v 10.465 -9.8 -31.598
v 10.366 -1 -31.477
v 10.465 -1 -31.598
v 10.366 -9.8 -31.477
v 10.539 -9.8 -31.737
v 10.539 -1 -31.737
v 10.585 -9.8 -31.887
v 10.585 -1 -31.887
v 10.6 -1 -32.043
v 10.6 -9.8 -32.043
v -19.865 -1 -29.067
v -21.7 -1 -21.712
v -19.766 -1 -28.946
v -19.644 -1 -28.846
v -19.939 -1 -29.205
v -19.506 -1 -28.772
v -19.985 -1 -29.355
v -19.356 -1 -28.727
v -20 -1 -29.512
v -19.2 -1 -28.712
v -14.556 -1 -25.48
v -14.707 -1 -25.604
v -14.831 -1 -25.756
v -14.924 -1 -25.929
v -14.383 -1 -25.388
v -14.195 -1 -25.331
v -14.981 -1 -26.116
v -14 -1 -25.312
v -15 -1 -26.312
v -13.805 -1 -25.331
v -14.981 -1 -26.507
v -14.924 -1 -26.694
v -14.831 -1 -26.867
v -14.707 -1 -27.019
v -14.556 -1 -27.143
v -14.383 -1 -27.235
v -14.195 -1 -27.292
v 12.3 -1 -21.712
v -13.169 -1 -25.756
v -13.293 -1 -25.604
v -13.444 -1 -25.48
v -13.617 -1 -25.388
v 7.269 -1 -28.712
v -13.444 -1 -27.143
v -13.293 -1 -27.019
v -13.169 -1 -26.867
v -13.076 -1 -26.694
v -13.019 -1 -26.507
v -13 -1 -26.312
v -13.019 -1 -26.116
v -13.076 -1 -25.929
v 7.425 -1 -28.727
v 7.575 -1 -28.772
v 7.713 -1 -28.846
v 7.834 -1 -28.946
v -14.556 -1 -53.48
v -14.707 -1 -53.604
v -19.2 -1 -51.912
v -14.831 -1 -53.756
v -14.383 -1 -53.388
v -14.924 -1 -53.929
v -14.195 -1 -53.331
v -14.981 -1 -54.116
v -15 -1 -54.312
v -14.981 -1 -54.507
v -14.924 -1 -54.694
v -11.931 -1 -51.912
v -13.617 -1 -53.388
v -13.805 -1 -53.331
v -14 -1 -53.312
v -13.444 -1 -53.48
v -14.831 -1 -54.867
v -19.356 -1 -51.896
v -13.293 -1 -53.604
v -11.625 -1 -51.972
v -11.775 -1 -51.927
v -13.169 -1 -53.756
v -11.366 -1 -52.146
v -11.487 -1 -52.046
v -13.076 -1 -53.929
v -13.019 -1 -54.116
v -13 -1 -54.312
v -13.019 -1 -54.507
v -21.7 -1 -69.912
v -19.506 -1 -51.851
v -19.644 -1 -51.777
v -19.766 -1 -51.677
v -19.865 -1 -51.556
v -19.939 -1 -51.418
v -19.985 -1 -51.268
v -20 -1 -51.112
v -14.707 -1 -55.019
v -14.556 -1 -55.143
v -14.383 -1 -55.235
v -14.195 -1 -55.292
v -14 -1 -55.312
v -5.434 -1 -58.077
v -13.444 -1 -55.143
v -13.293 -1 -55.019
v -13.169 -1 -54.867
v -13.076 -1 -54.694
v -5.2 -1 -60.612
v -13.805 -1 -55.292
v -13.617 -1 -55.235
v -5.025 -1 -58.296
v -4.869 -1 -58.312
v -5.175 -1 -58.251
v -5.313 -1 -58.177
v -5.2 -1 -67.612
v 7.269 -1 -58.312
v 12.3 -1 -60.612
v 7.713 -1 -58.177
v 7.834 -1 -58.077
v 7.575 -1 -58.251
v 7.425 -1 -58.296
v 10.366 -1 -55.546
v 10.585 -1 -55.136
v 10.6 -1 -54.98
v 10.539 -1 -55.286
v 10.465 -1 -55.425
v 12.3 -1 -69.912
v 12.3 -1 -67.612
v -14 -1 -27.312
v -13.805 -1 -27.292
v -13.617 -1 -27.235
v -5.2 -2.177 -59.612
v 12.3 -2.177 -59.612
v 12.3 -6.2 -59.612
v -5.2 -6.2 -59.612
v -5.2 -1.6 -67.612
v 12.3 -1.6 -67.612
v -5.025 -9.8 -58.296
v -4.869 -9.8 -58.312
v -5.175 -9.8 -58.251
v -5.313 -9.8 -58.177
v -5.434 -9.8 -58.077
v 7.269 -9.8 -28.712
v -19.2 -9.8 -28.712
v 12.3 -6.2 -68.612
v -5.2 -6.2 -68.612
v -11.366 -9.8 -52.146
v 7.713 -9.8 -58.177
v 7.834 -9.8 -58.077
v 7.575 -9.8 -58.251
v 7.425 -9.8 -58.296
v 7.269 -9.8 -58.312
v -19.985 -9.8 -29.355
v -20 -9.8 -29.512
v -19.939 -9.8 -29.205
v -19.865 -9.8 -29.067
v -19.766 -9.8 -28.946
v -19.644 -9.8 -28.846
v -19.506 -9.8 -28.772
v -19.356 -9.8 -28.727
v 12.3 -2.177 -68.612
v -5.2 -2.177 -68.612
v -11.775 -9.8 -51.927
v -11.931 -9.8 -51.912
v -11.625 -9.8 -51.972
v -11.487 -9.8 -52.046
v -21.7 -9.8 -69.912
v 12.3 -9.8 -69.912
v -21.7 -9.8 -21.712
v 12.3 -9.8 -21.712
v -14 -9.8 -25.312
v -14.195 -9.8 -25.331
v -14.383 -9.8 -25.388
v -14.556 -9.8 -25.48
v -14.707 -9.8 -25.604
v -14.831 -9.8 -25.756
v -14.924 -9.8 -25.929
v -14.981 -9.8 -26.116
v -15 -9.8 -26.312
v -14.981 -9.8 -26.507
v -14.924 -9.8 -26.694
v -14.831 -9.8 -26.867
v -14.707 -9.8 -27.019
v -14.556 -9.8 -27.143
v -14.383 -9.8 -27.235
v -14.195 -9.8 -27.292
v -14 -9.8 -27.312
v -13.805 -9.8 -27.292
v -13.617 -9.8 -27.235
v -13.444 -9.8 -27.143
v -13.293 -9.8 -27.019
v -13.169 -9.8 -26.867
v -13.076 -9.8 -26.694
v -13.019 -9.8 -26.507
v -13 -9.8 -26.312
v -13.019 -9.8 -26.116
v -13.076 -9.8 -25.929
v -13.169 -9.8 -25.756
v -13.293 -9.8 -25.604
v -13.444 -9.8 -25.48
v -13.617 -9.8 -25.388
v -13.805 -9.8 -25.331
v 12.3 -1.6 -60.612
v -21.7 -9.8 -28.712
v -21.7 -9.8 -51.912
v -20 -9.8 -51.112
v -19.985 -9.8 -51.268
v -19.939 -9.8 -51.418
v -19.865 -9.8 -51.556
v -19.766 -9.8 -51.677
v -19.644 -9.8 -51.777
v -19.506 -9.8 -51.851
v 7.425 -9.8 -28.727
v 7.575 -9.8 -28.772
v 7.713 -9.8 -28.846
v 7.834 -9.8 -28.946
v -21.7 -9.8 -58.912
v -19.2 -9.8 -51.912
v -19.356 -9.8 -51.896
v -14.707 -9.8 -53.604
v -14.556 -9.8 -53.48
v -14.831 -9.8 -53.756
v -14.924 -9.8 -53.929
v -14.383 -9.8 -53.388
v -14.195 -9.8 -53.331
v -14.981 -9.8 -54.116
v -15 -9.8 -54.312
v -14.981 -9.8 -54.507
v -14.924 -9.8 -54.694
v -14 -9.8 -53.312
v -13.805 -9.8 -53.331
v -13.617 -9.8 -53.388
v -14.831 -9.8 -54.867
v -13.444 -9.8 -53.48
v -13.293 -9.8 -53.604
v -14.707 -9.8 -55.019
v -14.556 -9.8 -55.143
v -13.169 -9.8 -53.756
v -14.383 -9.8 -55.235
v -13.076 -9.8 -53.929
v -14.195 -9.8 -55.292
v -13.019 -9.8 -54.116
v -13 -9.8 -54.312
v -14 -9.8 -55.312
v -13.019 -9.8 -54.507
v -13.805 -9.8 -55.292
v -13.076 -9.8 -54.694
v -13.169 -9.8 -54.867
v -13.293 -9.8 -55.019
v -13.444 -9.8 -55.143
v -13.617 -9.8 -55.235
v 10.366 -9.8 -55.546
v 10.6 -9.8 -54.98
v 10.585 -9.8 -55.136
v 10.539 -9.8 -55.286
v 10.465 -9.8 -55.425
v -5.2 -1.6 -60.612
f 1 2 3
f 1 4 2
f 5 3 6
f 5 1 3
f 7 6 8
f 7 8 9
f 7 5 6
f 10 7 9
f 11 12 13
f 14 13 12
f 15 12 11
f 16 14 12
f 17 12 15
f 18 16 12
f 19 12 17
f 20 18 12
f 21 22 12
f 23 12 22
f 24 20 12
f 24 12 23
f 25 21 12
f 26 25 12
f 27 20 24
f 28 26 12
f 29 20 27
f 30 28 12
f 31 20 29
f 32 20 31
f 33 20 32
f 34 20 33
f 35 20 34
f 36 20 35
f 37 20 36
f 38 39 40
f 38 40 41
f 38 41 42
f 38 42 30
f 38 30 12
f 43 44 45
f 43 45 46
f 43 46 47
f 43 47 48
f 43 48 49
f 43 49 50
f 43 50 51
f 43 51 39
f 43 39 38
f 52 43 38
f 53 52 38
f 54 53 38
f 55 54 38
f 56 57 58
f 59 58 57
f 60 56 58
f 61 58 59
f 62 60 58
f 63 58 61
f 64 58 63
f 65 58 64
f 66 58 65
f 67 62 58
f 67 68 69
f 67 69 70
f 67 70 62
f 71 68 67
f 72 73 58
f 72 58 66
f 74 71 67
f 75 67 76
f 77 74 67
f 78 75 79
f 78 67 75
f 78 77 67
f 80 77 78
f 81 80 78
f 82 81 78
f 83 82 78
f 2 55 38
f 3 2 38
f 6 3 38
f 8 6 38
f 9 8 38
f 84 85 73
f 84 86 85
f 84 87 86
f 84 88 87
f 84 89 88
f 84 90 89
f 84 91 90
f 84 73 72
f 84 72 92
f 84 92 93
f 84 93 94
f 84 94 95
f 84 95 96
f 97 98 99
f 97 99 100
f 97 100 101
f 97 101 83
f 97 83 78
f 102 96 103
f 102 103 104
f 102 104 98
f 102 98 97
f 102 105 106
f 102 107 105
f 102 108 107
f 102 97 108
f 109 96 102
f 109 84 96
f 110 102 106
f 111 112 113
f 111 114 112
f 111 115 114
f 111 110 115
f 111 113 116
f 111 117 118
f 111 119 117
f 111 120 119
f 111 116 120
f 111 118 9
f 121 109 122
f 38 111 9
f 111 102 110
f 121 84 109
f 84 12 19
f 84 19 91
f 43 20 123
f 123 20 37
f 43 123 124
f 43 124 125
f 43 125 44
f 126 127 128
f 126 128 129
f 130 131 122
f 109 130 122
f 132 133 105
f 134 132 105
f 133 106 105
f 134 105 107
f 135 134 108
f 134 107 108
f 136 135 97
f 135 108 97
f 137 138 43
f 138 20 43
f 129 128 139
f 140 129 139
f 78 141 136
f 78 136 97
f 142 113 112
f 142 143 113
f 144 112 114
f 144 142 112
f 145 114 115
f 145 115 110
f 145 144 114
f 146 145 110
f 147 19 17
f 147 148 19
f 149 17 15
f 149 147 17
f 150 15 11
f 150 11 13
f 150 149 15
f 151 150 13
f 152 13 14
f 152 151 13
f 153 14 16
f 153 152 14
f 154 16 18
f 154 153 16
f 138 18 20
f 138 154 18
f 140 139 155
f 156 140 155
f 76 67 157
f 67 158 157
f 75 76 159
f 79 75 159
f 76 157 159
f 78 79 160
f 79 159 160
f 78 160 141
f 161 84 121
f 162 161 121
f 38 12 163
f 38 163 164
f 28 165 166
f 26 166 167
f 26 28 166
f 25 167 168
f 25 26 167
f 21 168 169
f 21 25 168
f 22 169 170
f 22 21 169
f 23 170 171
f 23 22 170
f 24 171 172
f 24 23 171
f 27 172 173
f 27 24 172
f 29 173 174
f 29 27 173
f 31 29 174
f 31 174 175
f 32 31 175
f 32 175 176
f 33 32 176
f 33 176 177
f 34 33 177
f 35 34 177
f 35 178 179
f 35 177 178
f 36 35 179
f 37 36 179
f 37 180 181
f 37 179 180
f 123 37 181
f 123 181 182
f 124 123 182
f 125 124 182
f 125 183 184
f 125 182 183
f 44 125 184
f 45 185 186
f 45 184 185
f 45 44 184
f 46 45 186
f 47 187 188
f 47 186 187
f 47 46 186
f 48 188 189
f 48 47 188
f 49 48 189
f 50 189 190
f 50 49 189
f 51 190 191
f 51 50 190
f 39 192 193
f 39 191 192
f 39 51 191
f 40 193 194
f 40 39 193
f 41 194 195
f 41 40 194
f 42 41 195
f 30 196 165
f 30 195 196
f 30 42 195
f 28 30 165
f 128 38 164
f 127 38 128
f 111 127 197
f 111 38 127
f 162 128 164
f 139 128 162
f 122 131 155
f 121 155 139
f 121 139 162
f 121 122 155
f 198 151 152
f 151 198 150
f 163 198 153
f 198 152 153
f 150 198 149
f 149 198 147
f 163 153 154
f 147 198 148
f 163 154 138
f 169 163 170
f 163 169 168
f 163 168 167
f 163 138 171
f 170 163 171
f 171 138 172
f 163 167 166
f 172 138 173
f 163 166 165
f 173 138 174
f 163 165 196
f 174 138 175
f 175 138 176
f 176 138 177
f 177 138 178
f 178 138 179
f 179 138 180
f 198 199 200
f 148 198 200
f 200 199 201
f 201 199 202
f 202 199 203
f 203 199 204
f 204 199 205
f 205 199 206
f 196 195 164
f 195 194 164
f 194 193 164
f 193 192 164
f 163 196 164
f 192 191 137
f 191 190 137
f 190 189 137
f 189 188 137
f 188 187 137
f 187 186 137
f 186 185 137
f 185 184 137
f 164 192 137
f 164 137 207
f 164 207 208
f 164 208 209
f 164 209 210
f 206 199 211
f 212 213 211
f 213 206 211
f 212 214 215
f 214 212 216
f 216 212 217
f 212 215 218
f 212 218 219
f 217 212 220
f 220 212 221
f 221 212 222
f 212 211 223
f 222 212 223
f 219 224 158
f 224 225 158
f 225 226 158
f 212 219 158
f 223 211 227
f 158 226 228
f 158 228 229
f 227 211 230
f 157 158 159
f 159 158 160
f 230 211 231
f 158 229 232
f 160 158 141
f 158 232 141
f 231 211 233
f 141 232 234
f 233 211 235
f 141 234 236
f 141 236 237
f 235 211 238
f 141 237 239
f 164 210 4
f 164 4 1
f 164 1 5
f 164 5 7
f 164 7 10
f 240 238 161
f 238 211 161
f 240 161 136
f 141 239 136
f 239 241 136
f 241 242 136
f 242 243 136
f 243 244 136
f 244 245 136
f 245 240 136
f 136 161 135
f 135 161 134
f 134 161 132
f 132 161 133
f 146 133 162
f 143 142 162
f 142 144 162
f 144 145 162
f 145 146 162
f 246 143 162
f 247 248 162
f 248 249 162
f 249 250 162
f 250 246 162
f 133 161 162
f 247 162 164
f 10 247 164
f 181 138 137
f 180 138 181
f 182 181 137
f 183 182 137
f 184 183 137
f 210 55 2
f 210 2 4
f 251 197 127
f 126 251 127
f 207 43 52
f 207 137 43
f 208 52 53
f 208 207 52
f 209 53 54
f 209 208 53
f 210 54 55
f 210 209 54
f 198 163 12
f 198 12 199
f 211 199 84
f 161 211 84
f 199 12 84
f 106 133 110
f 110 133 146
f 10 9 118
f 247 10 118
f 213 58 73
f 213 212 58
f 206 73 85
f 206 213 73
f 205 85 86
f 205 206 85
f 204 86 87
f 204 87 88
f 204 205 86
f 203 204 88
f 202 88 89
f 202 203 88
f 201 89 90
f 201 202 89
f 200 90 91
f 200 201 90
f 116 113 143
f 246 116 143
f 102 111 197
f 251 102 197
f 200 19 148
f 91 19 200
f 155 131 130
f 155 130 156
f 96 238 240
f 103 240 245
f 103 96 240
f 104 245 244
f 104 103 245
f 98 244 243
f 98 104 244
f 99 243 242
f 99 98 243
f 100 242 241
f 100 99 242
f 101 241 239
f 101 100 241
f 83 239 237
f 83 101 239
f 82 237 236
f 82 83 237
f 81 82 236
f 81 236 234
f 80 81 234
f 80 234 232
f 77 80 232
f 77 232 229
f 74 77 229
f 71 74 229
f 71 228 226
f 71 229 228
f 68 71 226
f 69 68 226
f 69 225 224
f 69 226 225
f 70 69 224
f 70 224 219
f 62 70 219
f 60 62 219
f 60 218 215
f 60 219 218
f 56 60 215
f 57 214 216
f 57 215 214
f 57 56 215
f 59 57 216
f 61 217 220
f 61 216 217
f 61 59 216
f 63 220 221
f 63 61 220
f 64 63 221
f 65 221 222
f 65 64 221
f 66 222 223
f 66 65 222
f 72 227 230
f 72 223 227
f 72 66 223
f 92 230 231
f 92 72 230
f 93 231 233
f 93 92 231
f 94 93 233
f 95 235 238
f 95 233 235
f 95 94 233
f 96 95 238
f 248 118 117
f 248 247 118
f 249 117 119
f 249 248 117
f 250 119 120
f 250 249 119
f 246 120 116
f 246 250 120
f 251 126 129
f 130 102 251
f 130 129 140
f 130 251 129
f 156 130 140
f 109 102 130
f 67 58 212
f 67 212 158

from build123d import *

# Parameters (mm, degrees)
BOSS_EXTRUDE1_START      = -1
SKETCH1_W                = 1.7
SKETCH1_H                = 89.2
BOSS_EXTRUDE1_DEPTH      = 8.8
SKETCH4_W                = 33.7
SKETCH4_H                = 11.6
BOSS_EXTRUDE3_DEPTH      = 8.8
SERVO_HOLDER_DEPTH       = 1
SERVO_HOLDER_DEPTH_BACK  = 8.8
SKETCH3_W                = 14
SKETCH3_H                = 7
SKETCH3_R                = 1
SKETCH37_W               = 20
SKETCH37_H               = 7
BOSS_EXTRUDE19_DEPTH     = 9.8
CUT_EXTRUDE10_DEPTH      = 93.434679639
CUT_EXTRUDE10_DEPTH_BACK = 93.434679639
SKETCH29_W               = 34.409909993
SKETCH29_H               = 6.377389624
BOSS_EXTRUDE13_START     = 2
SKETCH30_W               = 34
SKETCH30_H               = 38
SKETCH30_R               = 1.6
BOSS_EXTRUDE13_DEPTH     = 6.5
SKETCH41_W               = 17.288461538
SKETCH41_H               = 8.8
CUT_EXTRUDE14_DEPTH      = 15
BOSS_EXTRUDE14_START     = -38
SKETCH32_R               = 1.45
SKETCH32_R_2             = 5
BOSS_EXTRUDE14_DEPTH     = 8.8
BOSS_EXTRUDE16_DEPTH     = 3
BOSS_EXTRUDE17_DEPTH     = 3
BOSS_EXTRUDE18_DEPTH     = 8.8
SKETCH39_W               = 1.7
SKETCH39_H               = 41.2
BOSS_EXTRUDE20_DEPTH     = 8.8
CUT_EXTRUDE13_DEPTH      = 17.5
CHAMFER2_SIZE            = 0.6
CHAMFER2_SIZE_2          = 1.039230485
CHAMFER3_SIZE            = 3
FILLET10_R               = 6
CUT_EXTRUDE15_DEPTH      = 10
CHAMFER4_SIZE            = 2.5
CUT_EXTRUDE16_DEPTH      = 10
FILLET11_R               = 0.8
SKETCH44_W               = 59.192885725
SKETCH44_H               = 45.417181718
CUT_EXTRUDE17_DEPTH      = 87.948983376


with BuildPart() as part:
    # Sketch1 → Boss-Extrude1 (new body)
    with BuildSketch(Plane(origin=(0, 0, 0), x_dir=(1, 0, 0), z_dir=(0, 1, 0)).offset(BOSS_EXTRUDE1_START)):
        with Locations((-20.85, 25.311538462)):
            Rectangle(SKETCH1_W, SKETCH1_H)
    extrude(amount=-BOSS_EXTRUDE1_DEPTH)

    # Sketch4 → Boss-Extrude3 (add)
    with BuildSketch(Plane.XZ.offset(9.8)):
        with Locations((-4.85, -64.111538462)):
            Rectangle(SKETCH4_W, SKETCH4_H)
    extrude(amount=-BOSS_EXTRUDE3_DEPTH)

    # Sketch3 → Servo Holder (add, two sides: drawn at the far end of the back side and taken through both)
    # profile 1 of 2: a face of its own
    with BuildSketch(Plane.XZ.offset(9.8).offset(-SERVO_HOLDER_DEPTH_BACK)):
        with Locations((-14.7, -55.411538462)):
            Rectangle(SKETCH3_W, SKETCH3_H)
        with Locations(Location((-14, -54.311538462, 0), (0, 0, 270))):
            Circle(SKETCH3_R, mode=Mode.SUBTRACT)
    # profile 2 of 2: a face of its own
    with BuildSketch(Plane.XZ.offset(9.8).offset(-SERVO_HOLDER_DEPTH_BACK)):
        with Locations((-14.7, -25.211538462)):
            Rectangle(SKETCH3_W, SKETCH3_H)
        with Locations(Location((-14, -26.311538462, 0), (0, 0, 90))):
            Circle(SKETCH3_R, mode=Mode.SUBTRACT)
    extrude(amount=SERVO_HOLDER_DEPTH + SERVO_HOLDER_DEPTH_BACK)

    # Sketch37 → Boss-Extrude19 (add)
    with BuildSketch(Plane(origin=(0, -1, 0), x_dir=(1, 0, 0), z_dir=(0, 1, 0))):
        with Locations((2.3, 25.211538462)):
            Rectangle(SKETCH37_W, SKETCH37_H)
    extrude(amount=-BOSS_EXTRUDE19_DEPTH)

    # Sketch29 → Cut-Extrude10 (cut, two sides: drawn at the far end of the back side and taken through both)
    with BuildSketch(Plane(origin=(0, 0, -69.911538462), x_dir=(-1, 0, 0), z_dir=(0, 0, -1)).offset(-CUT_EXTRUDE10_DEPTH_BACK)):
        with Locations((4.495045004, -12.988694812)):
            Rectangle(SKETCH29_W, SKETCH29_H)
    extrude(amount=CUT_EXTRUDE10_DEPTH + CUT_EXTRUDE10_DEPTH_BACK, mode=Mode.SUBTRACT)


with BuildPart() as body_2:
    # Sketch30 → Boss-Extrude13 (new body)
    with BuildSketch(Plane.XY.offset(BOSS_EXTRUDE13_START)):
        with Locations((-4.7, -20)):
            Rectangle(SKETCH30_W, SKETCH30_H)
        with Locations(Location((5.3, -34, 0), (0, 0, 180))):
            Circle(SKETCH30_R, mode=Mode.SUBTRACT)
        with Locations(Location((5.3, -19, 0), (0, 0, 180))):
            Circle(SKETCH30_R, mode=Mode.SUBTRACT)
        with Locations(Location((-14.7, -34, 0), (0, 0, 180))):
            Circle(SKETCH30_R, mode=Mode.SUBTRACT)
        with Locations(Location((-14.7, -19, 0), (0, 0, 180))):
            Circle(SKETCH30_R, mode=Mode.SUBTRACT)
    extrude(amount=BOSS_EXTRUDE13_DEPTH)


with BuildPart() as cut_extrude14_tool:
    # Sketch41 → Cut-Extrude14 (new body)
    with BuildSketch(Plane(origin=(-20, 0, 0), x_dir=(0, 0, -1), z_dir=(1, 0, 0))):
        with Locations((-10.644230769, -5.4)):
            Rectangle(SKETCH41_W, SKETCH41_H)
    extrude(amount=-CUT_EXTRUDE14_DEPTH)


with BuildPart() as part_1:
    add(part.part)

    # Cut-Extrude14: cut by cut_extrude14_tool
    add(cut_extrude14_tool.part, mode=Mode.SUBTRACT)



with BuildPart() as body_2_1:
    add(body_2.part)

    # Cut-Extrude14: cut by cut_extrude14_tool
    add(cut_extrude14_tool.part, mode=Mode.SUBTRACT)

    # Sketch32 → Boss-Extrude14 (add)
    with BuildSketch(Plane.XZ.offset(39).offset(BOSS_EXTRUDE14_START)):
        with BuildLine():
            ThreePointArc((11.872921748, 2), (25.925390485, -3.535644523), (35.05, 8.5))
            ThreePointArc((35.05, 8.5), (22.55, 21), (10.05, 8.5))
            Line((10.05, 8.5), (12.3, 8.5))
            Line((12.3, 8.5), (12.3, 2))
            Line((12.3, 2), (11.872921748, 2))
        make_face()
        with Locations(Location((15.25884337, 2.409923235, 0), (0, 0, 180))):
            Circle(SKETCH32_R, mode=Mode.SUBTRACT)
        with Locations(Location((28.640076765, 1.20884337, 0), (0, 0, 180))):
            Circle(SKETCH32_R, mode=Mode.SUBTRACT)
        with Locations(Location((16.459923235, 15.79115663, 0), (0, 0, 180))):
            Circle(SKETCH32_R, mode=Mode.SUBTRACT)
        with Locations(Location((22.55, 8.5, 0), (0, 0, 180))):
            Circle(SKETCH32_R_2, mode=Mode.SUBTRACT)
        with Locations(Location((29.84115663, 14.590076765, 0), (0, 0, 180))):
            Circle(SKETCH32_R, mode=Mode.SUBTRACT)
    extrude(amount=BOSS_EXTRUDE14_DEPTH)


with BuildPart() as part_2:
    add(part_1.part)

    add(body_2_1.part)  # Boss-Extrude16 merges body 2
    # Sketch34 → Boss-Extrude16 (add)
    with BuildSketch(Plane.ZY.offset(21.7)):
        Polygon((-21.711538462, -1), (-21.711538462, -9.8), (2, -39), (8.5, -39), (8.5, -1), align=None)
    extrude(amount=-BOSS_EXTRUDE16_DEPTH)

    # Sketch35 → Boss-Extrude17 (add)
    with BuildSketch(Plane(origin=(12.3, 0, 0), x_dir=(0, 0, -1), z_dir=(1, 0, 0))):
        Polygon((-2, -1), (21.711538462, -1), (21.711538462, -9.8), (-2, -39), (-8.5, -39), (-8.5, -9.8), (-8.5, -1), align=None)
    extrude(amount=-BOSS_EXTRUDE17_DEPTH)

    # Sketch36 → Boss-Extrude18 (add)
    with BuildSketch(Plane.XZ.offset(9.8)):
        Polygon((12.3, -10.579162849), (16.63422252, -2.511520186), (12.3, 1.345455989), align=None)
    extrude(amount=-BOSS_EXTRUDE18_DEPTH)

    # Sketch39 → Boss-Extrude20 (add)
    with BuildSketch(Plane(origin=(0, -1, 0), x_dir=(1, 0, 0), z_dir=(0, 1, 0))):
        with Locations((11.45, 49.311538462)):
            Rectangle(SKETCH39_W, SKETCH39_H)
    extrude(amount=-BOSS_EXTRUDE20_DEPTH)

    # Sketch40 → Cut-Extrude13 (cut)
    with BuildSketch(Plane(origin=(12.3, 0, 0), x_dir=(0, 0, -1), z_dir=(1, 0, 0))):
        Polygon((64.111538462, -1), (60.611538462, -1), (60.611538462, -2.2), (59.611538462, -2.2), (59.611538462, -6.2), (64.111538462, -6.2), align=None)
        Polygon((67.611538462, -1), (64.111538462, -1), (64.111538462, -6.2), (68.611538462, -6.2), (68.611538462, -2.2), (67.611538462, -2.2), align=None)
    extrude(amount=-CUT_EXTRUDE13_DEPTH, mode=Mode.SUBTRACT)

    # Chamfer2
    # the kernel refuses this chamfer: 1.039230485, 0.6 mm, written as the material it takes off along each edge
    with BuildSketch(Plane(origin=(14.988578382, -2.2, -67.611538462), x_dir=(0, 0.9983227437537925, 0.05789386240267319), z_dir=(-1, 0, 0))) as chamfer2_piece_1_section:
        Polygon((CHAMFER2_SIZE * 0.998322743754, CHAMFER2_SIZE * 0.0578938624027), (-CHAMFER2_SIZE_2 * 0.0578938623771, CHAMFER2_SIZE_2 * 0.998322743313), (0, 0), align=None)
    chamfer2_piece_1 = extrude(amount=20.188578382, mode=Mode.PRIVATE)
    chamfer2_piece_1 = split(chamfer2_piece_1, bisect_by=Plane(origin=(4.894289191, -2.005782009, -68.611538462), z_dir=(0, 0, 1)), keep=Keep.TOP, mode=Mode.PRIVATE)
    add(chamfer2_piece_1, mode=Mode.SUBTRACT)
    with BuildSketch(Plane(origin=(14.988578382, -2.2, -60.611538462), x_dir=(0, 0.9983227437537925, -0.05789386240267317), z_dir=(-1, 0, 0))) as chamfer2_piece_2_section:
        Polygon((CHAMFER2_SIZE * 0.998322743754, -CHAMFER2_SIZE * 0.0578938624027), (-CHAMFER2_SIZE_2 * 0.0578938623771, -CHAMFER2_SIZE_2 * 0.998322743313), (0, 0), align=None)
    chamfer2_piece_2 = extrude(amount=20.188578382, mode=Mode.PRIVATE)
    chamfer2_piece_2 = split(chamfer2_piece_2, bisect_by=Plane(origin=(4.894289191, -2.005782009, -59.611538462), z_dir=(0, 0, -1)), keep=Keep.TOP, mode=Mode.PRIVATE)
    add(chamfer2_piece_2, mode=Mode.SUBTRACT)

    # Chamfer3
    chamfer3_edges = [part_2.edges().sort_by_distance(p)[0] for p in [
        (10.6, -5.4, -58.311538462),
        (10.6, -5.4, -28.711538462),
    ]]
    chamfer(chamfer3_edges, length=CHAMFER3_SIZE)

    # Fillet10
    fillet10_edges = [part_2.edges().sort_by_distance(p)[0] for p in [
        (16.63422252, -5.4, -2.511520186),
        (12.3, -5.4, -10.579162849),
    ]]
    fillet(fillet10_edges, radius=FILLET10_R)

    # Sketch42 → Cut-Extrude15 (cut)
    with BuildSketch(Plane.XY.offset(8.5)):
        with BuildLine():
            Line((-1.1, -1), (-1.1, -10.6))
            ThreePointArc((-1.1, -10.6), (-4.7, -14.2), (-8.3, -10.6))
            Line((-8.3, -10.6), (-8.3, -1))
            Line((-8.3, -1), (-1.1, -1))
        make_face()
    extrude(amount=-CUT_EXTRUDE15_DEPTH, mode=Mode.SUBTRACT)

    # Chamfer4
    chamfer4_edges = [part_2.edges().sort_by_distance(p)[0] for p in [
        (-7.7, -5.4, -58.311538462),
    ]]
    chamfer(chamfer4_edges, length=CHAMFER4_SIZE)

    # Sketch43 → Cut-Extrude16 (cut)
    with BuildSketch(Plane(origin=(0, -1, 0), x_dir=(1, 0, 0), z_dir=(0, 1, 0))):
        Polygon((-5.2, 58.311538462), (-11.6, 51.911538462), (-5.2, 51.911538462), align=None)
    extrude(amount=-CUT_EXTRUDE16_DEPTH, mode=Mode.SUBTRACT)

    # Fillet11
    fillet11_edges = [part_2.edges().sort_by_distance(p)[0] for p in [
        (-20, -5.4, -28.711538462),
        (-20, -5.4, -51.911538462),
        (10.6, -5.4, -55.311538462),
        (10.6, -5.4, -31.711538462),
        (7.6, -5.4, -28.711538462),
        (7.6, -5.4, -58.311538462),
        (-5.2, -5.4, -58.311538462),
        (-11.6, -5.4, -51.911538462),
    ]]
    fillet(fillet11_edges, radius=FILLET11_R)

    # Sketch44 → Cut-Extrude17 (cut, through all)
    with BuildSketch(Plane(origin=(0, -1, 0), x_dir=(1, 0, 0), z_dir=(0, 1, 0))):
        with Locations((7.896442862, -0.997052397)):
            Rectangle(SKETCH44_W, SKETCH44_H)
    extrude(amount=-CUT_EXTRUDE17_DEPTH, mode=Mode.SUBTRACT)


solid = part_2.part
